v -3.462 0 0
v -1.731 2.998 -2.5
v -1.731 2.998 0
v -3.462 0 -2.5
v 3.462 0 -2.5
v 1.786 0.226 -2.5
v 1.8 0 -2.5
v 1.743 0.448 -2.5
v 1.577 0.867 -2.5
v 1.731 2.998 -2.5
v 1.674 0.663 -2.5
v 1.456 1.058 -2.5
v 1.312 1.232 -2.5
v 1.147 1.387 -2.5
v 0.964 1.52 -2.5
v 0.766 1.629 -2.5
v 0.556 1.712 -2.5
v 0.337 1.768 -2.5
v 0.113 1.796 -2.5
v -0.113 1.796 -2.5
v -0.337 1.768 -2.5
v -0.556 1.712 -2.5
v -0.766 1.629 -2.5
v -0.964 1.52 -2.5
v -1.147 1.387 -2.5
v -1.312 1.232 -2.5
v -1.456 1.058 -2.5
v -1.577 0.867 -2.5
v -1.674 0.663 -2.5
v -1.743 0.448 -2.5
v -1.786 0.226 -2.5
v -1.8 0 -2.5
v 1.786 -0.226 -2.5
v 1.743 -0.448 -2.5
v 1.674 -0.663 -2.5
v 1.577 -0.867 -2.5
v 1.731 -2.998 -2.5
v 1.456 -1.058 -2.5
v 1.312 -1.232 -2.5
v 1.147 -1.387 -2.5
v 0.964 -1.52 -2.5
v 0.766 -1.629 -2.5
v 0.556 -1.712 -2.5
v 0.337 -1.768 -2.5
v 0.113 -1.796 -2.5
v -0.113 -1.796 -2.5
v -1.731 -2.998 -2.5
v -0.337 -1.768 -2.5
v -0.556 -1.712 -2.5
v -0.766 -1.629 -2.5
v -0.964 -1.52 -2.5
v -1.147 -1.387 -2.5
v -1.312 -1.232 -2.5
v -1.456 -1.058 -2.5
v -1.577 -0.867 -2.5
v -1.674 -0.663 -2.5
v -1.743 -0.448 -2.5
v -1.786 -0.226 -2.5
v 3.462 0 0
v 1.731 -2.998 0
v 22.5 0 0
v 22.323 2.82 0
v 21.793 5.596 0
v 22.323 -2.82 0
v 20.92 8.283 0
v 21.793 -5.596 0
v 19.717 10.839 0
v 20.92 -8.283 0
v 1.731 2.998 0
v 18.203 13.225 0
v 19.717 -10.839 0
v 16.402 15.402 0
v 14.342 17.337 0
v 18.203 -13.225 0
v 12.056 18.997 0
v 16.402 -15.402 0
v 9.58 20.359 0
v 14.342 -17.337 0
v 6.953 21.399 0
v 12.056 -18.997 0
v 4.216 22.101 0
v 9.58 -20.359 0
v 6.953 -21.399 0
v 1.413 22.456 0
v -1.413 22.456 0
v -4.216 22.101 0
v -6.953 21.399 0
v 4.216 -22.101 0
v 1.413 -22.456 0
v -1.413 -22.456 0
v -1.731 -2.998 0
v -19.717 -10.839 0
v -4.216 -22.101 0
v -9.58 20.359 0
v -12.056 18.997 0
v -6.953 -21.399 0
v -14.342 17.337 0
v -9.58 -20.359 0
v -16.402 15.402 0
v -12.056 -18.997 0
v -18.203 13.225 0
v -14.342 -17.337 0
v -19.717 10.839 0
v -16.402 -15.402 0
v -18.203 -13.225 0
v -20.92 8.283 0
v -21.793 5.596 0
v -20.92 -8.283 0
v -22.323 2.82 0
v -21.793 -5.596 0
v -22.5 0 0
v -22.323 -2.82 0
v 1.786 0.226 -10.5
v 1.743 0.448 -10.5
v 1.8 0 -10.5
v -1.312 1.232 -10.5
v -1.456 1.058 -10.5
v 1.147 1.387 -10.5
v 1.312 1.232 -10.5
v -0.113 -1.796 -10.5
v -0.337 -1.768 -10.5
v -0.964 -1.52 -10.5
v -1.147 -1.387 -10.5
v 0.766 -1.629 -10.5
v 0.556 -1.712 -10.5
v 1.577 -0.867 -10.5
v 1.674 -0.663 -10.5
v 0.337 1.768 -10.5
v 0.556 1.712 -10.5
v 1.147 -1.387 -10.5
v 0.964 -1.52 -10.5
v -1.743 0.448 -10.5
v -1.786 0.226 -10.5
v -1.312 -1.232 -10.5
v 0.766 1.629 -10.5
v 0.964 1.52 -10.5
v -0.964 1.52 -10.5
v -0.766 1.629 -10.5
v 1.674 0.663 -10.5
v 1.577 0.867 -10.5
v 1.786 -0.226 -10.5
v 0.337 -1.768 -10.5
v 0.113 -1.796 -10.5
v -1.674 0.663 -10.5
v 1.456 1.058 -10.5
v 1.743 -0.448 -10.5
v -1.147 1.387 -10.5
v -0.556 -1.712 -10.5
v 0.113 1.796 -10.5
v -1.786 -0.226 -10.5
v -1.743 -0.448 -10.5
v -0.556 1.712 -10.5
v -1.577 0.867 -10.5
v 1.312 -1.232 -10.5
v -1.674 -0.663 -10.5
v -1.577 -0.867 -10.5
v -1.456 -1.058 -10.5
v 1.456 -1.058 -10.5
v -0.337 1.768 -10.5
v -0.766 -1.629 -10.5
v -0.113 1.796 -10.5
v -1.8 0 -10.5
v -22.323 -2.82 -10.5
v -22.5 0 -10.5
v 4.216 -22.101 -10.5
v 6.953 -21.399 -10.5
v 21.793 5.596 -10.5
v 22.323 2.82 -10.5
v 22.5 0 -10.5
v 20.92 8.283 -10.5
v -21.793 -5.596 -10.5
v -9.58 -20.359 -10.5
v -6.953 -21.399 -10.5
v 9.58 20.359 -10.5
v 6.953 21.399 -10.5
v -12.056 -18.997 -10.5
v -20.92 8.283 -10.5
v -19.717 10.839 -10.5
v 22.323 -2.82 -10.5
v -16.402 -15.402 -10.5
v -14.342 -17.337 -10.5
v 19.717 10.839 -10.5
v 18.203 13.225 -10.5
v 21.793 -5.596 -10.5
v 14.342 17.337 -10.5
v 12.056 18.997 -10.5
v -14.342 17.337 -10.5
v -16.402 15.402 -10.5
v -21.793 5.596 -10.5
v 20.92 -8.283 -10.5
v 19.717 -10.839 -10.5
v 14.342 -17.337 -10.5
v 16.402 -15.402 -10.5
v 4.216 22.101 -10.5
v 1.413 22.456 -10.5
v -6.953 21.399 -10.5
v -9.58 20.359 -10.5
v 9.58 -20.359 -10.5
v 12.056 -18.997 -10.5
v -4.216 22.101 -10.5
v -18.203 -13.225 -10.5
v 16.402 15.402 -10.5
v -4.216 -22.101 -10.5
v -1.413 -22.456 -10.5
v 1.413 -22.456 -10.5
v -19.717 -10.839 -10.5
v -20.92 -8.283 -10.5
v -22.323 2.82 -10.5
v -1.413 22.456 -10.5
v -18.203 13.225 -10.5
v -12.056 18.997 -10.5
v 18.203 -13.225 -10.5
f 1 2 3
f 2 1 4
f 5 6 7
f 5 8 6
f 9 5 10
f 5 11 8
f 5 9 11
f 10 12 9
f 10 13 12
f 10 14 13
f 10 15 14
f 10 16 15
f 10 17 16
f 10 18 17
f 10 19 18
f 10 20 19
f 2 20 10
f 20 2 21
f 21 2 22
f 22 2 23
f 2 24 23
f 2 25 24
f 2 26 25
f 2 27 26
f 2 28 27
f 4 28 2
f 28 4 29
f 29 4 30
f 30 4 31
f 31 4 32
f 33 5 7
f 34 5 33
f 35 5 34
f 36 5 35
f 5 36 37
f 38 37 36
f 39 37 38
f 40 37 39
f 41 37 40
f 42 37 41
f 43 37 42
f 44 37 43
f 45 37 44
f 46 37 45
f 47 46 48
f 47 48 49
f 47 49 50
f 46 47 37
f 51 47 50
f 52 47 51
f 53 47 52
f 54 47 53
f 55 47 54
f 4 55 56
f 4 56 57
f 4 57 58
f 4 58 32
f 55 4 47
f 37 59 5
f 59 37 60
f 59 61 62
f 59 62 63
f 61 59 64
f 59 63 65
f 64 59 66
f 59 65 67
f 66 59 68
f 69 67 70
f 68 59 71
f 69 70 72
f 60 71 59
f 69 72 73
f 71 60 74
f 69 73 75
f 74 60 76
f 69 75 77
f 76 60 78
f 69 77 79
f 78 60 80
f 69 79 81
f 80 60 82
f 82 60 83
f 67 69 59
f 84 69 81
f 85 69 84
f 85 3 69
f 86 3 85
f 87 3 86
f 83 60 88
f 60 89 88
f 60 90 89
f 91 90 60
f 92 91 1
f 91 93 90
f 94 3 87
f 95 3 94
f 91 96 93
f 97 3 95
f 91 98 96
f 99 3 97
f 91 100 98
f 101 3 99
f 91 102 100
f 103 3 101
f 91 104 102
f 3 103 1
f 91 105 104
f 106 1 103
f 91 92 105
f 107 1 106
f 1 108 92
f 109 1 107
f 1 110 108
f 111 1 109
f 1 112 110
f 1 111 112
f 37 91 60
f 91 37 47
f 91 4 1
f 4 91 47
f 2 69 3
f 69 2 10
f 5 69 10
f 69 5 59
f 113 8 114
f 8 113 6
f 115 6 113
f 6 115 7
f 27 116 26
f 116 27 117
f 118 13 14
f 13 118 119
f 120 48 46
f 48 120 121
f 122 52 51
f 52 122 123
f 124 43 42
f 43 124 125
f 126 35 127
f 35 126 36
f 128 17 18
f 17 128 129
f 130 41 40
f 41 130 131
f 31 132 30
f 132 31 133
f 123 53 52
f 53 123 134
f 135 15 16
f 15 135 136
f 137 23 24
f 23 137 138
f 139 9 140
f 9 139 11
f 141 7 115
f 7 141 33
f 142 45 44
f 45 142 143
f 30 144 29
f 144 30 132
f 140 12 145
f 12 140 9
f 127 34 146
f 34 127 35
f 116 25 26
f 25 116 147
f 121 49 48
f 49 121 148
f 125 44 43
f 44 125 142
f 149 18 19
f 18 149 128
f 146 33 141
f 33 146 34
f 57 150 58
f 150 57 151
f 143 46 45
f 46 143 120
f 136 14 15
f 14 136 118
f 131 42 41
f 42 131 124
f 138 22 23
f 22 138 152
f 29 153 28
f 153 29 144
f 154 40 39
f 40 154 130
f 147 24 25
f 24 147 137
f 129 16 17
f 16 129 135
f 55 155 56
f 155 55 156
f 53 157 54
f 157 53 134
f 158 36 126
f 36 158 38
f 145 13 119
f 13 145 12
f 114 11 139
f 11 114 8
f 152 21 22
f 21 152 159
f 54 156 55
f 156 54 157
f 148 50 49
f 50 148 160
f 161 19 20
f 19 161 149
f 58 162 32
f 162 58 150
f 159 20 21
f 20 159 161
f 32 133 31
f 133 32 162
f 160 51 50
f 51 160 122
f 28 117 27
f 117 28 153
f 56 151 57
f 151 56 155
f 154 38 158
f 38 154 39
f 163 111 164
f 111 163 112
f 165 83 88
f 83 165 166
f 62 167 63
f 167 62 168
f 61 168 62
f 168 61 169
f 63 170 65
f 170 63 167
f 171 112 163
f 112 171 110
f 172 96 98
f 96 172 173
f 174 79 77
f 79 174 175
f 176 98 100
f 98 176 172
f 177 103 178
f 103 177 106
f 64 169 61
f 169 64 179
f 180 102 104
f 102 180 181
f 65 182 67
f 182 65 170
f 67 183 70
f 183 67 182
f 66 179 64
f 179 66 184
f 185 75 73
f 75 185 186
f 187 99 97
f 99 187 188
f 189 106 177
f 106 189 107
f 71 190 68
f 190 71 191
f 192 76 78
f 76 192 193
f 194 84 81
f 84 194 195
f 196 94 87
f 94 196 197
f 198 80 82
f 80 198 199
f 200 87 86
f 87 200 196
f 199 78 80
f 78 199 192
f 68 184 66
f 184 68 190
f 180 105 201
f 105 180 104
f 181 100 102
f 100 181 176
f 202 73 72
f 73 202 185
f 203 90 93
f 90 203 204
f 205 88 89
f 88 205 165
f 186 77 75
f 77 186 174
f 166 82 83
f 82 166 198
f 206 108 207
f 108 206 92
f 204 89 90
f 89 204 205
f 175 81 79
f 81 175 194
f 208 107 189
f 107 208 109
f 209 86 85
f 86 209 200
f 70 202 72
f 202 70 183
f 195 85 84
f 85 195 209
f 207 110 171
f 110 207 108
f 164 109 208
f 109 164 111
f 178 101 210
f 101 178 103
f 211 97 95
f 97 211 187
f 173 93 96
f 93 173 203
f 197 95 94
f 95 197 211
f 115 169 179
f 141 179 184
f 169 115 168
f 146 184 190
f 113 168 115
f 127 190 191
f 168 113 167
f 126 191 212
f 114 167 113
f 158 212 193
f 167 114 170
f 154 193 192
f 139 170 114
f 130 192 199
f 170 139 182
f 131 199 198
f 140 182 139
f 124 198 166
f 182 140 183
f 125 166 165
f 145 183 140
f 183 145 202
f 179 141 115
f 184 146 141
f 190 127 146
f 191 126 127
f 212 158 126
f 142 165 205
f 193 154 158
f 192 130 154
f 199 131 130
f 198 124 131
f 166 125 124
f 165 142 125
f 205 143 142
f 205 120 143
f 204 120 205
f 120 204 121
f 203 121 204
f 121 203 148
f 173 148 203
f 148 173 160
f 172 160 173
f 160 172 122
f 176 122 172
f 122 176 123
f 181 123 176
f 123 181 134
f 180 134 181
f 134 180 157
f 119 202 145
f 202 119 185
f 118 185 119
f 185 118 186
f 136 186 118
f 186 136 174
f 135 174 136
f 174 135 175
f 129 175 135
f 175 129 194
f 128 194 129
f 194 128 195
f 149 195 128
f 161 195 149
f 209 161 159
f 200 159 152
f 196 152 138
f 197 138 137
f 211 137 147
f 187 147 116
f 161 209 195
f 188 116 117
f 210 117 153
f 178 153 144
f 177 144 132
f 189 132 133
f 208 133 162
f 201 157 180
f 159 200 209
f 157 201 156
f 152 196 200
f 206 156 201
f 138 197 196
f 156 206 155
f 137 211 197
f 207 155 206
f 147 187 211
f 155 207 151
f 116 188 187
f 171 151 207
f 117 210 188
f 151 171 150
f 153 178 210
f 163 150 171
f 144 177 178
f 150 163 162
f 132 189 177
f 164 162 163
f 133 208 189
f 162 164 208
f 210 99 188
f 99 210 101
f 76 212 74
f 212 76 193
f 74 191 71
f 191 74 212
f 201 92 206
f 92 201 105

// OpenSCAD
$fn = 50;

difference() {
	union() {
		translate(v = [0, 0, -10.5]) {
			cylinder(h = 10.5, r = 22.5);
		}
	}
	union() {
		translate(v = [0, 0, 0]) {
			rotate(a = [0, 0, 0]) {
				difference() {
					union() {
						translate(v = [0, 0, -2.5]) {
							linear_extrude(height = 2.5) {
								polygon(points = [[3.4619999999999997, 0.0], [1.7310000000000003, 2.9981799479017264], [-1.7309999999999992, 2.9981799479017264], [-3.4619999999999997, 4.2397272186481365e-16], [-1.7310000000000014, -2.998179947901726], [1.7309999999999977, -2.9981799479017277]]);
							}
						}
					}
					union();
				}
			}
		}
		#translate(v = [0, 0, -100.0]) {
			cylinder(h = 200, r = 1.8);
		}
	}
}
